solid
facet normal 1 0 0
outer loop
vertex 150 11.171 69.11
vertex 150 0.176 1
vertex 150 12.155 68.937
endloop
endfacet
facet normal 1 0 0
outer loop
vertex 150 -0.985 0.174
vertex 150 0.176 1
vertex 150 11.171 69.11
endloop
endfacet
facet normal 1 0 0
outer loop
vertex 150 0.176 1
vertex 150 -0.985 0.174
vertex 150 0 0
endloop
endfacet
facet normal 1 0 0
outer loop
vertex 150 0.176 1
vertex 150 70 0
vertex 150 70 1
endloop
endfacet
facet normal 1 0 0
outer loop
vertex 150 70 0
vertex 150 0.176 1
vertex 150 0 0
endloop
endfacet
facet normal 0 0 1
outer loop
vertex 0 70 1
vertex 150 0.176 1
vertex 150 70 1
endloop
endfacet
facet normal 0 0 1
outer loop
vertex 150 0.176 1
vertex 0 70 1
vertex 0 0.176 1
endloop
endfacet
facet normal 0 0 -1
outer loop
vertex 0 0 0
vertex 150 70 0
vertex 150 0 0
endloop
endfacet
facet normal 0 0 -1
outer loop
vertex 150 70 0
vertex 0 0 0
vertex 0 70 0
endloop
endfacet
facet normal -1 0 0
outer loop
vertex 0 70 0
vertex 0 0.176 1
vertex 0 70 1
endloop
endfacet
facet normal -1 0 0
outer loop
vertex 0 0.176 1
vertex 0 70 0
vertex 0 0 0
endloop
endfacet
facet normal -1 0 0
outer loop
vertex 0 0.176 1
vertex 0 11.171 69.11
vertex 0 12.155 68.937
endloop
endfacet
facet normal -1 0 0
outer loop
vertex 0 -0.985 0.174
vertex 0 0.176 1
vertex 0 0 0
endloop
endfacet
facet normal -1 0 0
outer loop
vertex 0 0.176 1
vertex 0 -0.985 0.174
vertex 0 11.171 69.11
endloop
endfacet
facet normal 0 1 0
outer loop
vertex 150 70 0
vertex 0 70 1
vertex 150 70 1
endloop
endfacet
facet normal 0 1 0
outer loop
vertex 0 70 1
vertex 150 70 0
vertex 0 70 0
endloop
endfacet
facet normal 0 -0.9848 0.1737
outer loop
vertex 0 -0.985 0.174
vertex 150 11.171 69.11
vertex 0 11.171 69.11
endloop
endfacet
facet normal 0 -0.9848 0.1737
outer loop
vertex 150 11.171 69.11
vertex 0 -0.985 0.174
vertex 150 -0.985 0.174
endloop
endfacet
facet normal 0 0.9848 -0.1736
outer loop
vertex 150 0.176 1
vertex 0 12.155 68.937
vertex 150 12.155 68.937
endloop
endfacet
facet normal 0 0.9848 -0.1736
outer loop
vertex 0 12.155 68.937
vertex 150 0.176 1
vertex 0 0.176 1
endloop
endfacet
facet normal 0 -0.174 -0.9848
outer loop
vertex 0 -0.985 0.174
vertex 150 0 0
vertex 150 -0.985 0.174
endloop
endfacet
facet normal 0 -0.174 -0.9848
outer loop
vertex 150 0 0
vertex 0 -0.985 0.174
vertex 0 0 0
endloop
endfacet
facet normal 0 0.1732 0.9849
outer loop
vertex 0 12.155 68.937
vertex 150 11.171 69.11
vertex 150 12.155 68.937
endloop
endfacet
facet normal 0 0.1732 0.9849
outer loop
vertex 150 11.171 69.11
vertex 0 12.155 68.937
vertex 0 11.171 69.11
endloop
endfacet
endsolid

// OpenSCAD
fn = 128;
length = 150;
width=70;
height=1;

module render() {
  cube(size = [length, width, height]);
  rotate(a=80, v=[1,0,0]) {
    cube(size = [length, width, height]);
  }
}

echo(version=version());

render();
